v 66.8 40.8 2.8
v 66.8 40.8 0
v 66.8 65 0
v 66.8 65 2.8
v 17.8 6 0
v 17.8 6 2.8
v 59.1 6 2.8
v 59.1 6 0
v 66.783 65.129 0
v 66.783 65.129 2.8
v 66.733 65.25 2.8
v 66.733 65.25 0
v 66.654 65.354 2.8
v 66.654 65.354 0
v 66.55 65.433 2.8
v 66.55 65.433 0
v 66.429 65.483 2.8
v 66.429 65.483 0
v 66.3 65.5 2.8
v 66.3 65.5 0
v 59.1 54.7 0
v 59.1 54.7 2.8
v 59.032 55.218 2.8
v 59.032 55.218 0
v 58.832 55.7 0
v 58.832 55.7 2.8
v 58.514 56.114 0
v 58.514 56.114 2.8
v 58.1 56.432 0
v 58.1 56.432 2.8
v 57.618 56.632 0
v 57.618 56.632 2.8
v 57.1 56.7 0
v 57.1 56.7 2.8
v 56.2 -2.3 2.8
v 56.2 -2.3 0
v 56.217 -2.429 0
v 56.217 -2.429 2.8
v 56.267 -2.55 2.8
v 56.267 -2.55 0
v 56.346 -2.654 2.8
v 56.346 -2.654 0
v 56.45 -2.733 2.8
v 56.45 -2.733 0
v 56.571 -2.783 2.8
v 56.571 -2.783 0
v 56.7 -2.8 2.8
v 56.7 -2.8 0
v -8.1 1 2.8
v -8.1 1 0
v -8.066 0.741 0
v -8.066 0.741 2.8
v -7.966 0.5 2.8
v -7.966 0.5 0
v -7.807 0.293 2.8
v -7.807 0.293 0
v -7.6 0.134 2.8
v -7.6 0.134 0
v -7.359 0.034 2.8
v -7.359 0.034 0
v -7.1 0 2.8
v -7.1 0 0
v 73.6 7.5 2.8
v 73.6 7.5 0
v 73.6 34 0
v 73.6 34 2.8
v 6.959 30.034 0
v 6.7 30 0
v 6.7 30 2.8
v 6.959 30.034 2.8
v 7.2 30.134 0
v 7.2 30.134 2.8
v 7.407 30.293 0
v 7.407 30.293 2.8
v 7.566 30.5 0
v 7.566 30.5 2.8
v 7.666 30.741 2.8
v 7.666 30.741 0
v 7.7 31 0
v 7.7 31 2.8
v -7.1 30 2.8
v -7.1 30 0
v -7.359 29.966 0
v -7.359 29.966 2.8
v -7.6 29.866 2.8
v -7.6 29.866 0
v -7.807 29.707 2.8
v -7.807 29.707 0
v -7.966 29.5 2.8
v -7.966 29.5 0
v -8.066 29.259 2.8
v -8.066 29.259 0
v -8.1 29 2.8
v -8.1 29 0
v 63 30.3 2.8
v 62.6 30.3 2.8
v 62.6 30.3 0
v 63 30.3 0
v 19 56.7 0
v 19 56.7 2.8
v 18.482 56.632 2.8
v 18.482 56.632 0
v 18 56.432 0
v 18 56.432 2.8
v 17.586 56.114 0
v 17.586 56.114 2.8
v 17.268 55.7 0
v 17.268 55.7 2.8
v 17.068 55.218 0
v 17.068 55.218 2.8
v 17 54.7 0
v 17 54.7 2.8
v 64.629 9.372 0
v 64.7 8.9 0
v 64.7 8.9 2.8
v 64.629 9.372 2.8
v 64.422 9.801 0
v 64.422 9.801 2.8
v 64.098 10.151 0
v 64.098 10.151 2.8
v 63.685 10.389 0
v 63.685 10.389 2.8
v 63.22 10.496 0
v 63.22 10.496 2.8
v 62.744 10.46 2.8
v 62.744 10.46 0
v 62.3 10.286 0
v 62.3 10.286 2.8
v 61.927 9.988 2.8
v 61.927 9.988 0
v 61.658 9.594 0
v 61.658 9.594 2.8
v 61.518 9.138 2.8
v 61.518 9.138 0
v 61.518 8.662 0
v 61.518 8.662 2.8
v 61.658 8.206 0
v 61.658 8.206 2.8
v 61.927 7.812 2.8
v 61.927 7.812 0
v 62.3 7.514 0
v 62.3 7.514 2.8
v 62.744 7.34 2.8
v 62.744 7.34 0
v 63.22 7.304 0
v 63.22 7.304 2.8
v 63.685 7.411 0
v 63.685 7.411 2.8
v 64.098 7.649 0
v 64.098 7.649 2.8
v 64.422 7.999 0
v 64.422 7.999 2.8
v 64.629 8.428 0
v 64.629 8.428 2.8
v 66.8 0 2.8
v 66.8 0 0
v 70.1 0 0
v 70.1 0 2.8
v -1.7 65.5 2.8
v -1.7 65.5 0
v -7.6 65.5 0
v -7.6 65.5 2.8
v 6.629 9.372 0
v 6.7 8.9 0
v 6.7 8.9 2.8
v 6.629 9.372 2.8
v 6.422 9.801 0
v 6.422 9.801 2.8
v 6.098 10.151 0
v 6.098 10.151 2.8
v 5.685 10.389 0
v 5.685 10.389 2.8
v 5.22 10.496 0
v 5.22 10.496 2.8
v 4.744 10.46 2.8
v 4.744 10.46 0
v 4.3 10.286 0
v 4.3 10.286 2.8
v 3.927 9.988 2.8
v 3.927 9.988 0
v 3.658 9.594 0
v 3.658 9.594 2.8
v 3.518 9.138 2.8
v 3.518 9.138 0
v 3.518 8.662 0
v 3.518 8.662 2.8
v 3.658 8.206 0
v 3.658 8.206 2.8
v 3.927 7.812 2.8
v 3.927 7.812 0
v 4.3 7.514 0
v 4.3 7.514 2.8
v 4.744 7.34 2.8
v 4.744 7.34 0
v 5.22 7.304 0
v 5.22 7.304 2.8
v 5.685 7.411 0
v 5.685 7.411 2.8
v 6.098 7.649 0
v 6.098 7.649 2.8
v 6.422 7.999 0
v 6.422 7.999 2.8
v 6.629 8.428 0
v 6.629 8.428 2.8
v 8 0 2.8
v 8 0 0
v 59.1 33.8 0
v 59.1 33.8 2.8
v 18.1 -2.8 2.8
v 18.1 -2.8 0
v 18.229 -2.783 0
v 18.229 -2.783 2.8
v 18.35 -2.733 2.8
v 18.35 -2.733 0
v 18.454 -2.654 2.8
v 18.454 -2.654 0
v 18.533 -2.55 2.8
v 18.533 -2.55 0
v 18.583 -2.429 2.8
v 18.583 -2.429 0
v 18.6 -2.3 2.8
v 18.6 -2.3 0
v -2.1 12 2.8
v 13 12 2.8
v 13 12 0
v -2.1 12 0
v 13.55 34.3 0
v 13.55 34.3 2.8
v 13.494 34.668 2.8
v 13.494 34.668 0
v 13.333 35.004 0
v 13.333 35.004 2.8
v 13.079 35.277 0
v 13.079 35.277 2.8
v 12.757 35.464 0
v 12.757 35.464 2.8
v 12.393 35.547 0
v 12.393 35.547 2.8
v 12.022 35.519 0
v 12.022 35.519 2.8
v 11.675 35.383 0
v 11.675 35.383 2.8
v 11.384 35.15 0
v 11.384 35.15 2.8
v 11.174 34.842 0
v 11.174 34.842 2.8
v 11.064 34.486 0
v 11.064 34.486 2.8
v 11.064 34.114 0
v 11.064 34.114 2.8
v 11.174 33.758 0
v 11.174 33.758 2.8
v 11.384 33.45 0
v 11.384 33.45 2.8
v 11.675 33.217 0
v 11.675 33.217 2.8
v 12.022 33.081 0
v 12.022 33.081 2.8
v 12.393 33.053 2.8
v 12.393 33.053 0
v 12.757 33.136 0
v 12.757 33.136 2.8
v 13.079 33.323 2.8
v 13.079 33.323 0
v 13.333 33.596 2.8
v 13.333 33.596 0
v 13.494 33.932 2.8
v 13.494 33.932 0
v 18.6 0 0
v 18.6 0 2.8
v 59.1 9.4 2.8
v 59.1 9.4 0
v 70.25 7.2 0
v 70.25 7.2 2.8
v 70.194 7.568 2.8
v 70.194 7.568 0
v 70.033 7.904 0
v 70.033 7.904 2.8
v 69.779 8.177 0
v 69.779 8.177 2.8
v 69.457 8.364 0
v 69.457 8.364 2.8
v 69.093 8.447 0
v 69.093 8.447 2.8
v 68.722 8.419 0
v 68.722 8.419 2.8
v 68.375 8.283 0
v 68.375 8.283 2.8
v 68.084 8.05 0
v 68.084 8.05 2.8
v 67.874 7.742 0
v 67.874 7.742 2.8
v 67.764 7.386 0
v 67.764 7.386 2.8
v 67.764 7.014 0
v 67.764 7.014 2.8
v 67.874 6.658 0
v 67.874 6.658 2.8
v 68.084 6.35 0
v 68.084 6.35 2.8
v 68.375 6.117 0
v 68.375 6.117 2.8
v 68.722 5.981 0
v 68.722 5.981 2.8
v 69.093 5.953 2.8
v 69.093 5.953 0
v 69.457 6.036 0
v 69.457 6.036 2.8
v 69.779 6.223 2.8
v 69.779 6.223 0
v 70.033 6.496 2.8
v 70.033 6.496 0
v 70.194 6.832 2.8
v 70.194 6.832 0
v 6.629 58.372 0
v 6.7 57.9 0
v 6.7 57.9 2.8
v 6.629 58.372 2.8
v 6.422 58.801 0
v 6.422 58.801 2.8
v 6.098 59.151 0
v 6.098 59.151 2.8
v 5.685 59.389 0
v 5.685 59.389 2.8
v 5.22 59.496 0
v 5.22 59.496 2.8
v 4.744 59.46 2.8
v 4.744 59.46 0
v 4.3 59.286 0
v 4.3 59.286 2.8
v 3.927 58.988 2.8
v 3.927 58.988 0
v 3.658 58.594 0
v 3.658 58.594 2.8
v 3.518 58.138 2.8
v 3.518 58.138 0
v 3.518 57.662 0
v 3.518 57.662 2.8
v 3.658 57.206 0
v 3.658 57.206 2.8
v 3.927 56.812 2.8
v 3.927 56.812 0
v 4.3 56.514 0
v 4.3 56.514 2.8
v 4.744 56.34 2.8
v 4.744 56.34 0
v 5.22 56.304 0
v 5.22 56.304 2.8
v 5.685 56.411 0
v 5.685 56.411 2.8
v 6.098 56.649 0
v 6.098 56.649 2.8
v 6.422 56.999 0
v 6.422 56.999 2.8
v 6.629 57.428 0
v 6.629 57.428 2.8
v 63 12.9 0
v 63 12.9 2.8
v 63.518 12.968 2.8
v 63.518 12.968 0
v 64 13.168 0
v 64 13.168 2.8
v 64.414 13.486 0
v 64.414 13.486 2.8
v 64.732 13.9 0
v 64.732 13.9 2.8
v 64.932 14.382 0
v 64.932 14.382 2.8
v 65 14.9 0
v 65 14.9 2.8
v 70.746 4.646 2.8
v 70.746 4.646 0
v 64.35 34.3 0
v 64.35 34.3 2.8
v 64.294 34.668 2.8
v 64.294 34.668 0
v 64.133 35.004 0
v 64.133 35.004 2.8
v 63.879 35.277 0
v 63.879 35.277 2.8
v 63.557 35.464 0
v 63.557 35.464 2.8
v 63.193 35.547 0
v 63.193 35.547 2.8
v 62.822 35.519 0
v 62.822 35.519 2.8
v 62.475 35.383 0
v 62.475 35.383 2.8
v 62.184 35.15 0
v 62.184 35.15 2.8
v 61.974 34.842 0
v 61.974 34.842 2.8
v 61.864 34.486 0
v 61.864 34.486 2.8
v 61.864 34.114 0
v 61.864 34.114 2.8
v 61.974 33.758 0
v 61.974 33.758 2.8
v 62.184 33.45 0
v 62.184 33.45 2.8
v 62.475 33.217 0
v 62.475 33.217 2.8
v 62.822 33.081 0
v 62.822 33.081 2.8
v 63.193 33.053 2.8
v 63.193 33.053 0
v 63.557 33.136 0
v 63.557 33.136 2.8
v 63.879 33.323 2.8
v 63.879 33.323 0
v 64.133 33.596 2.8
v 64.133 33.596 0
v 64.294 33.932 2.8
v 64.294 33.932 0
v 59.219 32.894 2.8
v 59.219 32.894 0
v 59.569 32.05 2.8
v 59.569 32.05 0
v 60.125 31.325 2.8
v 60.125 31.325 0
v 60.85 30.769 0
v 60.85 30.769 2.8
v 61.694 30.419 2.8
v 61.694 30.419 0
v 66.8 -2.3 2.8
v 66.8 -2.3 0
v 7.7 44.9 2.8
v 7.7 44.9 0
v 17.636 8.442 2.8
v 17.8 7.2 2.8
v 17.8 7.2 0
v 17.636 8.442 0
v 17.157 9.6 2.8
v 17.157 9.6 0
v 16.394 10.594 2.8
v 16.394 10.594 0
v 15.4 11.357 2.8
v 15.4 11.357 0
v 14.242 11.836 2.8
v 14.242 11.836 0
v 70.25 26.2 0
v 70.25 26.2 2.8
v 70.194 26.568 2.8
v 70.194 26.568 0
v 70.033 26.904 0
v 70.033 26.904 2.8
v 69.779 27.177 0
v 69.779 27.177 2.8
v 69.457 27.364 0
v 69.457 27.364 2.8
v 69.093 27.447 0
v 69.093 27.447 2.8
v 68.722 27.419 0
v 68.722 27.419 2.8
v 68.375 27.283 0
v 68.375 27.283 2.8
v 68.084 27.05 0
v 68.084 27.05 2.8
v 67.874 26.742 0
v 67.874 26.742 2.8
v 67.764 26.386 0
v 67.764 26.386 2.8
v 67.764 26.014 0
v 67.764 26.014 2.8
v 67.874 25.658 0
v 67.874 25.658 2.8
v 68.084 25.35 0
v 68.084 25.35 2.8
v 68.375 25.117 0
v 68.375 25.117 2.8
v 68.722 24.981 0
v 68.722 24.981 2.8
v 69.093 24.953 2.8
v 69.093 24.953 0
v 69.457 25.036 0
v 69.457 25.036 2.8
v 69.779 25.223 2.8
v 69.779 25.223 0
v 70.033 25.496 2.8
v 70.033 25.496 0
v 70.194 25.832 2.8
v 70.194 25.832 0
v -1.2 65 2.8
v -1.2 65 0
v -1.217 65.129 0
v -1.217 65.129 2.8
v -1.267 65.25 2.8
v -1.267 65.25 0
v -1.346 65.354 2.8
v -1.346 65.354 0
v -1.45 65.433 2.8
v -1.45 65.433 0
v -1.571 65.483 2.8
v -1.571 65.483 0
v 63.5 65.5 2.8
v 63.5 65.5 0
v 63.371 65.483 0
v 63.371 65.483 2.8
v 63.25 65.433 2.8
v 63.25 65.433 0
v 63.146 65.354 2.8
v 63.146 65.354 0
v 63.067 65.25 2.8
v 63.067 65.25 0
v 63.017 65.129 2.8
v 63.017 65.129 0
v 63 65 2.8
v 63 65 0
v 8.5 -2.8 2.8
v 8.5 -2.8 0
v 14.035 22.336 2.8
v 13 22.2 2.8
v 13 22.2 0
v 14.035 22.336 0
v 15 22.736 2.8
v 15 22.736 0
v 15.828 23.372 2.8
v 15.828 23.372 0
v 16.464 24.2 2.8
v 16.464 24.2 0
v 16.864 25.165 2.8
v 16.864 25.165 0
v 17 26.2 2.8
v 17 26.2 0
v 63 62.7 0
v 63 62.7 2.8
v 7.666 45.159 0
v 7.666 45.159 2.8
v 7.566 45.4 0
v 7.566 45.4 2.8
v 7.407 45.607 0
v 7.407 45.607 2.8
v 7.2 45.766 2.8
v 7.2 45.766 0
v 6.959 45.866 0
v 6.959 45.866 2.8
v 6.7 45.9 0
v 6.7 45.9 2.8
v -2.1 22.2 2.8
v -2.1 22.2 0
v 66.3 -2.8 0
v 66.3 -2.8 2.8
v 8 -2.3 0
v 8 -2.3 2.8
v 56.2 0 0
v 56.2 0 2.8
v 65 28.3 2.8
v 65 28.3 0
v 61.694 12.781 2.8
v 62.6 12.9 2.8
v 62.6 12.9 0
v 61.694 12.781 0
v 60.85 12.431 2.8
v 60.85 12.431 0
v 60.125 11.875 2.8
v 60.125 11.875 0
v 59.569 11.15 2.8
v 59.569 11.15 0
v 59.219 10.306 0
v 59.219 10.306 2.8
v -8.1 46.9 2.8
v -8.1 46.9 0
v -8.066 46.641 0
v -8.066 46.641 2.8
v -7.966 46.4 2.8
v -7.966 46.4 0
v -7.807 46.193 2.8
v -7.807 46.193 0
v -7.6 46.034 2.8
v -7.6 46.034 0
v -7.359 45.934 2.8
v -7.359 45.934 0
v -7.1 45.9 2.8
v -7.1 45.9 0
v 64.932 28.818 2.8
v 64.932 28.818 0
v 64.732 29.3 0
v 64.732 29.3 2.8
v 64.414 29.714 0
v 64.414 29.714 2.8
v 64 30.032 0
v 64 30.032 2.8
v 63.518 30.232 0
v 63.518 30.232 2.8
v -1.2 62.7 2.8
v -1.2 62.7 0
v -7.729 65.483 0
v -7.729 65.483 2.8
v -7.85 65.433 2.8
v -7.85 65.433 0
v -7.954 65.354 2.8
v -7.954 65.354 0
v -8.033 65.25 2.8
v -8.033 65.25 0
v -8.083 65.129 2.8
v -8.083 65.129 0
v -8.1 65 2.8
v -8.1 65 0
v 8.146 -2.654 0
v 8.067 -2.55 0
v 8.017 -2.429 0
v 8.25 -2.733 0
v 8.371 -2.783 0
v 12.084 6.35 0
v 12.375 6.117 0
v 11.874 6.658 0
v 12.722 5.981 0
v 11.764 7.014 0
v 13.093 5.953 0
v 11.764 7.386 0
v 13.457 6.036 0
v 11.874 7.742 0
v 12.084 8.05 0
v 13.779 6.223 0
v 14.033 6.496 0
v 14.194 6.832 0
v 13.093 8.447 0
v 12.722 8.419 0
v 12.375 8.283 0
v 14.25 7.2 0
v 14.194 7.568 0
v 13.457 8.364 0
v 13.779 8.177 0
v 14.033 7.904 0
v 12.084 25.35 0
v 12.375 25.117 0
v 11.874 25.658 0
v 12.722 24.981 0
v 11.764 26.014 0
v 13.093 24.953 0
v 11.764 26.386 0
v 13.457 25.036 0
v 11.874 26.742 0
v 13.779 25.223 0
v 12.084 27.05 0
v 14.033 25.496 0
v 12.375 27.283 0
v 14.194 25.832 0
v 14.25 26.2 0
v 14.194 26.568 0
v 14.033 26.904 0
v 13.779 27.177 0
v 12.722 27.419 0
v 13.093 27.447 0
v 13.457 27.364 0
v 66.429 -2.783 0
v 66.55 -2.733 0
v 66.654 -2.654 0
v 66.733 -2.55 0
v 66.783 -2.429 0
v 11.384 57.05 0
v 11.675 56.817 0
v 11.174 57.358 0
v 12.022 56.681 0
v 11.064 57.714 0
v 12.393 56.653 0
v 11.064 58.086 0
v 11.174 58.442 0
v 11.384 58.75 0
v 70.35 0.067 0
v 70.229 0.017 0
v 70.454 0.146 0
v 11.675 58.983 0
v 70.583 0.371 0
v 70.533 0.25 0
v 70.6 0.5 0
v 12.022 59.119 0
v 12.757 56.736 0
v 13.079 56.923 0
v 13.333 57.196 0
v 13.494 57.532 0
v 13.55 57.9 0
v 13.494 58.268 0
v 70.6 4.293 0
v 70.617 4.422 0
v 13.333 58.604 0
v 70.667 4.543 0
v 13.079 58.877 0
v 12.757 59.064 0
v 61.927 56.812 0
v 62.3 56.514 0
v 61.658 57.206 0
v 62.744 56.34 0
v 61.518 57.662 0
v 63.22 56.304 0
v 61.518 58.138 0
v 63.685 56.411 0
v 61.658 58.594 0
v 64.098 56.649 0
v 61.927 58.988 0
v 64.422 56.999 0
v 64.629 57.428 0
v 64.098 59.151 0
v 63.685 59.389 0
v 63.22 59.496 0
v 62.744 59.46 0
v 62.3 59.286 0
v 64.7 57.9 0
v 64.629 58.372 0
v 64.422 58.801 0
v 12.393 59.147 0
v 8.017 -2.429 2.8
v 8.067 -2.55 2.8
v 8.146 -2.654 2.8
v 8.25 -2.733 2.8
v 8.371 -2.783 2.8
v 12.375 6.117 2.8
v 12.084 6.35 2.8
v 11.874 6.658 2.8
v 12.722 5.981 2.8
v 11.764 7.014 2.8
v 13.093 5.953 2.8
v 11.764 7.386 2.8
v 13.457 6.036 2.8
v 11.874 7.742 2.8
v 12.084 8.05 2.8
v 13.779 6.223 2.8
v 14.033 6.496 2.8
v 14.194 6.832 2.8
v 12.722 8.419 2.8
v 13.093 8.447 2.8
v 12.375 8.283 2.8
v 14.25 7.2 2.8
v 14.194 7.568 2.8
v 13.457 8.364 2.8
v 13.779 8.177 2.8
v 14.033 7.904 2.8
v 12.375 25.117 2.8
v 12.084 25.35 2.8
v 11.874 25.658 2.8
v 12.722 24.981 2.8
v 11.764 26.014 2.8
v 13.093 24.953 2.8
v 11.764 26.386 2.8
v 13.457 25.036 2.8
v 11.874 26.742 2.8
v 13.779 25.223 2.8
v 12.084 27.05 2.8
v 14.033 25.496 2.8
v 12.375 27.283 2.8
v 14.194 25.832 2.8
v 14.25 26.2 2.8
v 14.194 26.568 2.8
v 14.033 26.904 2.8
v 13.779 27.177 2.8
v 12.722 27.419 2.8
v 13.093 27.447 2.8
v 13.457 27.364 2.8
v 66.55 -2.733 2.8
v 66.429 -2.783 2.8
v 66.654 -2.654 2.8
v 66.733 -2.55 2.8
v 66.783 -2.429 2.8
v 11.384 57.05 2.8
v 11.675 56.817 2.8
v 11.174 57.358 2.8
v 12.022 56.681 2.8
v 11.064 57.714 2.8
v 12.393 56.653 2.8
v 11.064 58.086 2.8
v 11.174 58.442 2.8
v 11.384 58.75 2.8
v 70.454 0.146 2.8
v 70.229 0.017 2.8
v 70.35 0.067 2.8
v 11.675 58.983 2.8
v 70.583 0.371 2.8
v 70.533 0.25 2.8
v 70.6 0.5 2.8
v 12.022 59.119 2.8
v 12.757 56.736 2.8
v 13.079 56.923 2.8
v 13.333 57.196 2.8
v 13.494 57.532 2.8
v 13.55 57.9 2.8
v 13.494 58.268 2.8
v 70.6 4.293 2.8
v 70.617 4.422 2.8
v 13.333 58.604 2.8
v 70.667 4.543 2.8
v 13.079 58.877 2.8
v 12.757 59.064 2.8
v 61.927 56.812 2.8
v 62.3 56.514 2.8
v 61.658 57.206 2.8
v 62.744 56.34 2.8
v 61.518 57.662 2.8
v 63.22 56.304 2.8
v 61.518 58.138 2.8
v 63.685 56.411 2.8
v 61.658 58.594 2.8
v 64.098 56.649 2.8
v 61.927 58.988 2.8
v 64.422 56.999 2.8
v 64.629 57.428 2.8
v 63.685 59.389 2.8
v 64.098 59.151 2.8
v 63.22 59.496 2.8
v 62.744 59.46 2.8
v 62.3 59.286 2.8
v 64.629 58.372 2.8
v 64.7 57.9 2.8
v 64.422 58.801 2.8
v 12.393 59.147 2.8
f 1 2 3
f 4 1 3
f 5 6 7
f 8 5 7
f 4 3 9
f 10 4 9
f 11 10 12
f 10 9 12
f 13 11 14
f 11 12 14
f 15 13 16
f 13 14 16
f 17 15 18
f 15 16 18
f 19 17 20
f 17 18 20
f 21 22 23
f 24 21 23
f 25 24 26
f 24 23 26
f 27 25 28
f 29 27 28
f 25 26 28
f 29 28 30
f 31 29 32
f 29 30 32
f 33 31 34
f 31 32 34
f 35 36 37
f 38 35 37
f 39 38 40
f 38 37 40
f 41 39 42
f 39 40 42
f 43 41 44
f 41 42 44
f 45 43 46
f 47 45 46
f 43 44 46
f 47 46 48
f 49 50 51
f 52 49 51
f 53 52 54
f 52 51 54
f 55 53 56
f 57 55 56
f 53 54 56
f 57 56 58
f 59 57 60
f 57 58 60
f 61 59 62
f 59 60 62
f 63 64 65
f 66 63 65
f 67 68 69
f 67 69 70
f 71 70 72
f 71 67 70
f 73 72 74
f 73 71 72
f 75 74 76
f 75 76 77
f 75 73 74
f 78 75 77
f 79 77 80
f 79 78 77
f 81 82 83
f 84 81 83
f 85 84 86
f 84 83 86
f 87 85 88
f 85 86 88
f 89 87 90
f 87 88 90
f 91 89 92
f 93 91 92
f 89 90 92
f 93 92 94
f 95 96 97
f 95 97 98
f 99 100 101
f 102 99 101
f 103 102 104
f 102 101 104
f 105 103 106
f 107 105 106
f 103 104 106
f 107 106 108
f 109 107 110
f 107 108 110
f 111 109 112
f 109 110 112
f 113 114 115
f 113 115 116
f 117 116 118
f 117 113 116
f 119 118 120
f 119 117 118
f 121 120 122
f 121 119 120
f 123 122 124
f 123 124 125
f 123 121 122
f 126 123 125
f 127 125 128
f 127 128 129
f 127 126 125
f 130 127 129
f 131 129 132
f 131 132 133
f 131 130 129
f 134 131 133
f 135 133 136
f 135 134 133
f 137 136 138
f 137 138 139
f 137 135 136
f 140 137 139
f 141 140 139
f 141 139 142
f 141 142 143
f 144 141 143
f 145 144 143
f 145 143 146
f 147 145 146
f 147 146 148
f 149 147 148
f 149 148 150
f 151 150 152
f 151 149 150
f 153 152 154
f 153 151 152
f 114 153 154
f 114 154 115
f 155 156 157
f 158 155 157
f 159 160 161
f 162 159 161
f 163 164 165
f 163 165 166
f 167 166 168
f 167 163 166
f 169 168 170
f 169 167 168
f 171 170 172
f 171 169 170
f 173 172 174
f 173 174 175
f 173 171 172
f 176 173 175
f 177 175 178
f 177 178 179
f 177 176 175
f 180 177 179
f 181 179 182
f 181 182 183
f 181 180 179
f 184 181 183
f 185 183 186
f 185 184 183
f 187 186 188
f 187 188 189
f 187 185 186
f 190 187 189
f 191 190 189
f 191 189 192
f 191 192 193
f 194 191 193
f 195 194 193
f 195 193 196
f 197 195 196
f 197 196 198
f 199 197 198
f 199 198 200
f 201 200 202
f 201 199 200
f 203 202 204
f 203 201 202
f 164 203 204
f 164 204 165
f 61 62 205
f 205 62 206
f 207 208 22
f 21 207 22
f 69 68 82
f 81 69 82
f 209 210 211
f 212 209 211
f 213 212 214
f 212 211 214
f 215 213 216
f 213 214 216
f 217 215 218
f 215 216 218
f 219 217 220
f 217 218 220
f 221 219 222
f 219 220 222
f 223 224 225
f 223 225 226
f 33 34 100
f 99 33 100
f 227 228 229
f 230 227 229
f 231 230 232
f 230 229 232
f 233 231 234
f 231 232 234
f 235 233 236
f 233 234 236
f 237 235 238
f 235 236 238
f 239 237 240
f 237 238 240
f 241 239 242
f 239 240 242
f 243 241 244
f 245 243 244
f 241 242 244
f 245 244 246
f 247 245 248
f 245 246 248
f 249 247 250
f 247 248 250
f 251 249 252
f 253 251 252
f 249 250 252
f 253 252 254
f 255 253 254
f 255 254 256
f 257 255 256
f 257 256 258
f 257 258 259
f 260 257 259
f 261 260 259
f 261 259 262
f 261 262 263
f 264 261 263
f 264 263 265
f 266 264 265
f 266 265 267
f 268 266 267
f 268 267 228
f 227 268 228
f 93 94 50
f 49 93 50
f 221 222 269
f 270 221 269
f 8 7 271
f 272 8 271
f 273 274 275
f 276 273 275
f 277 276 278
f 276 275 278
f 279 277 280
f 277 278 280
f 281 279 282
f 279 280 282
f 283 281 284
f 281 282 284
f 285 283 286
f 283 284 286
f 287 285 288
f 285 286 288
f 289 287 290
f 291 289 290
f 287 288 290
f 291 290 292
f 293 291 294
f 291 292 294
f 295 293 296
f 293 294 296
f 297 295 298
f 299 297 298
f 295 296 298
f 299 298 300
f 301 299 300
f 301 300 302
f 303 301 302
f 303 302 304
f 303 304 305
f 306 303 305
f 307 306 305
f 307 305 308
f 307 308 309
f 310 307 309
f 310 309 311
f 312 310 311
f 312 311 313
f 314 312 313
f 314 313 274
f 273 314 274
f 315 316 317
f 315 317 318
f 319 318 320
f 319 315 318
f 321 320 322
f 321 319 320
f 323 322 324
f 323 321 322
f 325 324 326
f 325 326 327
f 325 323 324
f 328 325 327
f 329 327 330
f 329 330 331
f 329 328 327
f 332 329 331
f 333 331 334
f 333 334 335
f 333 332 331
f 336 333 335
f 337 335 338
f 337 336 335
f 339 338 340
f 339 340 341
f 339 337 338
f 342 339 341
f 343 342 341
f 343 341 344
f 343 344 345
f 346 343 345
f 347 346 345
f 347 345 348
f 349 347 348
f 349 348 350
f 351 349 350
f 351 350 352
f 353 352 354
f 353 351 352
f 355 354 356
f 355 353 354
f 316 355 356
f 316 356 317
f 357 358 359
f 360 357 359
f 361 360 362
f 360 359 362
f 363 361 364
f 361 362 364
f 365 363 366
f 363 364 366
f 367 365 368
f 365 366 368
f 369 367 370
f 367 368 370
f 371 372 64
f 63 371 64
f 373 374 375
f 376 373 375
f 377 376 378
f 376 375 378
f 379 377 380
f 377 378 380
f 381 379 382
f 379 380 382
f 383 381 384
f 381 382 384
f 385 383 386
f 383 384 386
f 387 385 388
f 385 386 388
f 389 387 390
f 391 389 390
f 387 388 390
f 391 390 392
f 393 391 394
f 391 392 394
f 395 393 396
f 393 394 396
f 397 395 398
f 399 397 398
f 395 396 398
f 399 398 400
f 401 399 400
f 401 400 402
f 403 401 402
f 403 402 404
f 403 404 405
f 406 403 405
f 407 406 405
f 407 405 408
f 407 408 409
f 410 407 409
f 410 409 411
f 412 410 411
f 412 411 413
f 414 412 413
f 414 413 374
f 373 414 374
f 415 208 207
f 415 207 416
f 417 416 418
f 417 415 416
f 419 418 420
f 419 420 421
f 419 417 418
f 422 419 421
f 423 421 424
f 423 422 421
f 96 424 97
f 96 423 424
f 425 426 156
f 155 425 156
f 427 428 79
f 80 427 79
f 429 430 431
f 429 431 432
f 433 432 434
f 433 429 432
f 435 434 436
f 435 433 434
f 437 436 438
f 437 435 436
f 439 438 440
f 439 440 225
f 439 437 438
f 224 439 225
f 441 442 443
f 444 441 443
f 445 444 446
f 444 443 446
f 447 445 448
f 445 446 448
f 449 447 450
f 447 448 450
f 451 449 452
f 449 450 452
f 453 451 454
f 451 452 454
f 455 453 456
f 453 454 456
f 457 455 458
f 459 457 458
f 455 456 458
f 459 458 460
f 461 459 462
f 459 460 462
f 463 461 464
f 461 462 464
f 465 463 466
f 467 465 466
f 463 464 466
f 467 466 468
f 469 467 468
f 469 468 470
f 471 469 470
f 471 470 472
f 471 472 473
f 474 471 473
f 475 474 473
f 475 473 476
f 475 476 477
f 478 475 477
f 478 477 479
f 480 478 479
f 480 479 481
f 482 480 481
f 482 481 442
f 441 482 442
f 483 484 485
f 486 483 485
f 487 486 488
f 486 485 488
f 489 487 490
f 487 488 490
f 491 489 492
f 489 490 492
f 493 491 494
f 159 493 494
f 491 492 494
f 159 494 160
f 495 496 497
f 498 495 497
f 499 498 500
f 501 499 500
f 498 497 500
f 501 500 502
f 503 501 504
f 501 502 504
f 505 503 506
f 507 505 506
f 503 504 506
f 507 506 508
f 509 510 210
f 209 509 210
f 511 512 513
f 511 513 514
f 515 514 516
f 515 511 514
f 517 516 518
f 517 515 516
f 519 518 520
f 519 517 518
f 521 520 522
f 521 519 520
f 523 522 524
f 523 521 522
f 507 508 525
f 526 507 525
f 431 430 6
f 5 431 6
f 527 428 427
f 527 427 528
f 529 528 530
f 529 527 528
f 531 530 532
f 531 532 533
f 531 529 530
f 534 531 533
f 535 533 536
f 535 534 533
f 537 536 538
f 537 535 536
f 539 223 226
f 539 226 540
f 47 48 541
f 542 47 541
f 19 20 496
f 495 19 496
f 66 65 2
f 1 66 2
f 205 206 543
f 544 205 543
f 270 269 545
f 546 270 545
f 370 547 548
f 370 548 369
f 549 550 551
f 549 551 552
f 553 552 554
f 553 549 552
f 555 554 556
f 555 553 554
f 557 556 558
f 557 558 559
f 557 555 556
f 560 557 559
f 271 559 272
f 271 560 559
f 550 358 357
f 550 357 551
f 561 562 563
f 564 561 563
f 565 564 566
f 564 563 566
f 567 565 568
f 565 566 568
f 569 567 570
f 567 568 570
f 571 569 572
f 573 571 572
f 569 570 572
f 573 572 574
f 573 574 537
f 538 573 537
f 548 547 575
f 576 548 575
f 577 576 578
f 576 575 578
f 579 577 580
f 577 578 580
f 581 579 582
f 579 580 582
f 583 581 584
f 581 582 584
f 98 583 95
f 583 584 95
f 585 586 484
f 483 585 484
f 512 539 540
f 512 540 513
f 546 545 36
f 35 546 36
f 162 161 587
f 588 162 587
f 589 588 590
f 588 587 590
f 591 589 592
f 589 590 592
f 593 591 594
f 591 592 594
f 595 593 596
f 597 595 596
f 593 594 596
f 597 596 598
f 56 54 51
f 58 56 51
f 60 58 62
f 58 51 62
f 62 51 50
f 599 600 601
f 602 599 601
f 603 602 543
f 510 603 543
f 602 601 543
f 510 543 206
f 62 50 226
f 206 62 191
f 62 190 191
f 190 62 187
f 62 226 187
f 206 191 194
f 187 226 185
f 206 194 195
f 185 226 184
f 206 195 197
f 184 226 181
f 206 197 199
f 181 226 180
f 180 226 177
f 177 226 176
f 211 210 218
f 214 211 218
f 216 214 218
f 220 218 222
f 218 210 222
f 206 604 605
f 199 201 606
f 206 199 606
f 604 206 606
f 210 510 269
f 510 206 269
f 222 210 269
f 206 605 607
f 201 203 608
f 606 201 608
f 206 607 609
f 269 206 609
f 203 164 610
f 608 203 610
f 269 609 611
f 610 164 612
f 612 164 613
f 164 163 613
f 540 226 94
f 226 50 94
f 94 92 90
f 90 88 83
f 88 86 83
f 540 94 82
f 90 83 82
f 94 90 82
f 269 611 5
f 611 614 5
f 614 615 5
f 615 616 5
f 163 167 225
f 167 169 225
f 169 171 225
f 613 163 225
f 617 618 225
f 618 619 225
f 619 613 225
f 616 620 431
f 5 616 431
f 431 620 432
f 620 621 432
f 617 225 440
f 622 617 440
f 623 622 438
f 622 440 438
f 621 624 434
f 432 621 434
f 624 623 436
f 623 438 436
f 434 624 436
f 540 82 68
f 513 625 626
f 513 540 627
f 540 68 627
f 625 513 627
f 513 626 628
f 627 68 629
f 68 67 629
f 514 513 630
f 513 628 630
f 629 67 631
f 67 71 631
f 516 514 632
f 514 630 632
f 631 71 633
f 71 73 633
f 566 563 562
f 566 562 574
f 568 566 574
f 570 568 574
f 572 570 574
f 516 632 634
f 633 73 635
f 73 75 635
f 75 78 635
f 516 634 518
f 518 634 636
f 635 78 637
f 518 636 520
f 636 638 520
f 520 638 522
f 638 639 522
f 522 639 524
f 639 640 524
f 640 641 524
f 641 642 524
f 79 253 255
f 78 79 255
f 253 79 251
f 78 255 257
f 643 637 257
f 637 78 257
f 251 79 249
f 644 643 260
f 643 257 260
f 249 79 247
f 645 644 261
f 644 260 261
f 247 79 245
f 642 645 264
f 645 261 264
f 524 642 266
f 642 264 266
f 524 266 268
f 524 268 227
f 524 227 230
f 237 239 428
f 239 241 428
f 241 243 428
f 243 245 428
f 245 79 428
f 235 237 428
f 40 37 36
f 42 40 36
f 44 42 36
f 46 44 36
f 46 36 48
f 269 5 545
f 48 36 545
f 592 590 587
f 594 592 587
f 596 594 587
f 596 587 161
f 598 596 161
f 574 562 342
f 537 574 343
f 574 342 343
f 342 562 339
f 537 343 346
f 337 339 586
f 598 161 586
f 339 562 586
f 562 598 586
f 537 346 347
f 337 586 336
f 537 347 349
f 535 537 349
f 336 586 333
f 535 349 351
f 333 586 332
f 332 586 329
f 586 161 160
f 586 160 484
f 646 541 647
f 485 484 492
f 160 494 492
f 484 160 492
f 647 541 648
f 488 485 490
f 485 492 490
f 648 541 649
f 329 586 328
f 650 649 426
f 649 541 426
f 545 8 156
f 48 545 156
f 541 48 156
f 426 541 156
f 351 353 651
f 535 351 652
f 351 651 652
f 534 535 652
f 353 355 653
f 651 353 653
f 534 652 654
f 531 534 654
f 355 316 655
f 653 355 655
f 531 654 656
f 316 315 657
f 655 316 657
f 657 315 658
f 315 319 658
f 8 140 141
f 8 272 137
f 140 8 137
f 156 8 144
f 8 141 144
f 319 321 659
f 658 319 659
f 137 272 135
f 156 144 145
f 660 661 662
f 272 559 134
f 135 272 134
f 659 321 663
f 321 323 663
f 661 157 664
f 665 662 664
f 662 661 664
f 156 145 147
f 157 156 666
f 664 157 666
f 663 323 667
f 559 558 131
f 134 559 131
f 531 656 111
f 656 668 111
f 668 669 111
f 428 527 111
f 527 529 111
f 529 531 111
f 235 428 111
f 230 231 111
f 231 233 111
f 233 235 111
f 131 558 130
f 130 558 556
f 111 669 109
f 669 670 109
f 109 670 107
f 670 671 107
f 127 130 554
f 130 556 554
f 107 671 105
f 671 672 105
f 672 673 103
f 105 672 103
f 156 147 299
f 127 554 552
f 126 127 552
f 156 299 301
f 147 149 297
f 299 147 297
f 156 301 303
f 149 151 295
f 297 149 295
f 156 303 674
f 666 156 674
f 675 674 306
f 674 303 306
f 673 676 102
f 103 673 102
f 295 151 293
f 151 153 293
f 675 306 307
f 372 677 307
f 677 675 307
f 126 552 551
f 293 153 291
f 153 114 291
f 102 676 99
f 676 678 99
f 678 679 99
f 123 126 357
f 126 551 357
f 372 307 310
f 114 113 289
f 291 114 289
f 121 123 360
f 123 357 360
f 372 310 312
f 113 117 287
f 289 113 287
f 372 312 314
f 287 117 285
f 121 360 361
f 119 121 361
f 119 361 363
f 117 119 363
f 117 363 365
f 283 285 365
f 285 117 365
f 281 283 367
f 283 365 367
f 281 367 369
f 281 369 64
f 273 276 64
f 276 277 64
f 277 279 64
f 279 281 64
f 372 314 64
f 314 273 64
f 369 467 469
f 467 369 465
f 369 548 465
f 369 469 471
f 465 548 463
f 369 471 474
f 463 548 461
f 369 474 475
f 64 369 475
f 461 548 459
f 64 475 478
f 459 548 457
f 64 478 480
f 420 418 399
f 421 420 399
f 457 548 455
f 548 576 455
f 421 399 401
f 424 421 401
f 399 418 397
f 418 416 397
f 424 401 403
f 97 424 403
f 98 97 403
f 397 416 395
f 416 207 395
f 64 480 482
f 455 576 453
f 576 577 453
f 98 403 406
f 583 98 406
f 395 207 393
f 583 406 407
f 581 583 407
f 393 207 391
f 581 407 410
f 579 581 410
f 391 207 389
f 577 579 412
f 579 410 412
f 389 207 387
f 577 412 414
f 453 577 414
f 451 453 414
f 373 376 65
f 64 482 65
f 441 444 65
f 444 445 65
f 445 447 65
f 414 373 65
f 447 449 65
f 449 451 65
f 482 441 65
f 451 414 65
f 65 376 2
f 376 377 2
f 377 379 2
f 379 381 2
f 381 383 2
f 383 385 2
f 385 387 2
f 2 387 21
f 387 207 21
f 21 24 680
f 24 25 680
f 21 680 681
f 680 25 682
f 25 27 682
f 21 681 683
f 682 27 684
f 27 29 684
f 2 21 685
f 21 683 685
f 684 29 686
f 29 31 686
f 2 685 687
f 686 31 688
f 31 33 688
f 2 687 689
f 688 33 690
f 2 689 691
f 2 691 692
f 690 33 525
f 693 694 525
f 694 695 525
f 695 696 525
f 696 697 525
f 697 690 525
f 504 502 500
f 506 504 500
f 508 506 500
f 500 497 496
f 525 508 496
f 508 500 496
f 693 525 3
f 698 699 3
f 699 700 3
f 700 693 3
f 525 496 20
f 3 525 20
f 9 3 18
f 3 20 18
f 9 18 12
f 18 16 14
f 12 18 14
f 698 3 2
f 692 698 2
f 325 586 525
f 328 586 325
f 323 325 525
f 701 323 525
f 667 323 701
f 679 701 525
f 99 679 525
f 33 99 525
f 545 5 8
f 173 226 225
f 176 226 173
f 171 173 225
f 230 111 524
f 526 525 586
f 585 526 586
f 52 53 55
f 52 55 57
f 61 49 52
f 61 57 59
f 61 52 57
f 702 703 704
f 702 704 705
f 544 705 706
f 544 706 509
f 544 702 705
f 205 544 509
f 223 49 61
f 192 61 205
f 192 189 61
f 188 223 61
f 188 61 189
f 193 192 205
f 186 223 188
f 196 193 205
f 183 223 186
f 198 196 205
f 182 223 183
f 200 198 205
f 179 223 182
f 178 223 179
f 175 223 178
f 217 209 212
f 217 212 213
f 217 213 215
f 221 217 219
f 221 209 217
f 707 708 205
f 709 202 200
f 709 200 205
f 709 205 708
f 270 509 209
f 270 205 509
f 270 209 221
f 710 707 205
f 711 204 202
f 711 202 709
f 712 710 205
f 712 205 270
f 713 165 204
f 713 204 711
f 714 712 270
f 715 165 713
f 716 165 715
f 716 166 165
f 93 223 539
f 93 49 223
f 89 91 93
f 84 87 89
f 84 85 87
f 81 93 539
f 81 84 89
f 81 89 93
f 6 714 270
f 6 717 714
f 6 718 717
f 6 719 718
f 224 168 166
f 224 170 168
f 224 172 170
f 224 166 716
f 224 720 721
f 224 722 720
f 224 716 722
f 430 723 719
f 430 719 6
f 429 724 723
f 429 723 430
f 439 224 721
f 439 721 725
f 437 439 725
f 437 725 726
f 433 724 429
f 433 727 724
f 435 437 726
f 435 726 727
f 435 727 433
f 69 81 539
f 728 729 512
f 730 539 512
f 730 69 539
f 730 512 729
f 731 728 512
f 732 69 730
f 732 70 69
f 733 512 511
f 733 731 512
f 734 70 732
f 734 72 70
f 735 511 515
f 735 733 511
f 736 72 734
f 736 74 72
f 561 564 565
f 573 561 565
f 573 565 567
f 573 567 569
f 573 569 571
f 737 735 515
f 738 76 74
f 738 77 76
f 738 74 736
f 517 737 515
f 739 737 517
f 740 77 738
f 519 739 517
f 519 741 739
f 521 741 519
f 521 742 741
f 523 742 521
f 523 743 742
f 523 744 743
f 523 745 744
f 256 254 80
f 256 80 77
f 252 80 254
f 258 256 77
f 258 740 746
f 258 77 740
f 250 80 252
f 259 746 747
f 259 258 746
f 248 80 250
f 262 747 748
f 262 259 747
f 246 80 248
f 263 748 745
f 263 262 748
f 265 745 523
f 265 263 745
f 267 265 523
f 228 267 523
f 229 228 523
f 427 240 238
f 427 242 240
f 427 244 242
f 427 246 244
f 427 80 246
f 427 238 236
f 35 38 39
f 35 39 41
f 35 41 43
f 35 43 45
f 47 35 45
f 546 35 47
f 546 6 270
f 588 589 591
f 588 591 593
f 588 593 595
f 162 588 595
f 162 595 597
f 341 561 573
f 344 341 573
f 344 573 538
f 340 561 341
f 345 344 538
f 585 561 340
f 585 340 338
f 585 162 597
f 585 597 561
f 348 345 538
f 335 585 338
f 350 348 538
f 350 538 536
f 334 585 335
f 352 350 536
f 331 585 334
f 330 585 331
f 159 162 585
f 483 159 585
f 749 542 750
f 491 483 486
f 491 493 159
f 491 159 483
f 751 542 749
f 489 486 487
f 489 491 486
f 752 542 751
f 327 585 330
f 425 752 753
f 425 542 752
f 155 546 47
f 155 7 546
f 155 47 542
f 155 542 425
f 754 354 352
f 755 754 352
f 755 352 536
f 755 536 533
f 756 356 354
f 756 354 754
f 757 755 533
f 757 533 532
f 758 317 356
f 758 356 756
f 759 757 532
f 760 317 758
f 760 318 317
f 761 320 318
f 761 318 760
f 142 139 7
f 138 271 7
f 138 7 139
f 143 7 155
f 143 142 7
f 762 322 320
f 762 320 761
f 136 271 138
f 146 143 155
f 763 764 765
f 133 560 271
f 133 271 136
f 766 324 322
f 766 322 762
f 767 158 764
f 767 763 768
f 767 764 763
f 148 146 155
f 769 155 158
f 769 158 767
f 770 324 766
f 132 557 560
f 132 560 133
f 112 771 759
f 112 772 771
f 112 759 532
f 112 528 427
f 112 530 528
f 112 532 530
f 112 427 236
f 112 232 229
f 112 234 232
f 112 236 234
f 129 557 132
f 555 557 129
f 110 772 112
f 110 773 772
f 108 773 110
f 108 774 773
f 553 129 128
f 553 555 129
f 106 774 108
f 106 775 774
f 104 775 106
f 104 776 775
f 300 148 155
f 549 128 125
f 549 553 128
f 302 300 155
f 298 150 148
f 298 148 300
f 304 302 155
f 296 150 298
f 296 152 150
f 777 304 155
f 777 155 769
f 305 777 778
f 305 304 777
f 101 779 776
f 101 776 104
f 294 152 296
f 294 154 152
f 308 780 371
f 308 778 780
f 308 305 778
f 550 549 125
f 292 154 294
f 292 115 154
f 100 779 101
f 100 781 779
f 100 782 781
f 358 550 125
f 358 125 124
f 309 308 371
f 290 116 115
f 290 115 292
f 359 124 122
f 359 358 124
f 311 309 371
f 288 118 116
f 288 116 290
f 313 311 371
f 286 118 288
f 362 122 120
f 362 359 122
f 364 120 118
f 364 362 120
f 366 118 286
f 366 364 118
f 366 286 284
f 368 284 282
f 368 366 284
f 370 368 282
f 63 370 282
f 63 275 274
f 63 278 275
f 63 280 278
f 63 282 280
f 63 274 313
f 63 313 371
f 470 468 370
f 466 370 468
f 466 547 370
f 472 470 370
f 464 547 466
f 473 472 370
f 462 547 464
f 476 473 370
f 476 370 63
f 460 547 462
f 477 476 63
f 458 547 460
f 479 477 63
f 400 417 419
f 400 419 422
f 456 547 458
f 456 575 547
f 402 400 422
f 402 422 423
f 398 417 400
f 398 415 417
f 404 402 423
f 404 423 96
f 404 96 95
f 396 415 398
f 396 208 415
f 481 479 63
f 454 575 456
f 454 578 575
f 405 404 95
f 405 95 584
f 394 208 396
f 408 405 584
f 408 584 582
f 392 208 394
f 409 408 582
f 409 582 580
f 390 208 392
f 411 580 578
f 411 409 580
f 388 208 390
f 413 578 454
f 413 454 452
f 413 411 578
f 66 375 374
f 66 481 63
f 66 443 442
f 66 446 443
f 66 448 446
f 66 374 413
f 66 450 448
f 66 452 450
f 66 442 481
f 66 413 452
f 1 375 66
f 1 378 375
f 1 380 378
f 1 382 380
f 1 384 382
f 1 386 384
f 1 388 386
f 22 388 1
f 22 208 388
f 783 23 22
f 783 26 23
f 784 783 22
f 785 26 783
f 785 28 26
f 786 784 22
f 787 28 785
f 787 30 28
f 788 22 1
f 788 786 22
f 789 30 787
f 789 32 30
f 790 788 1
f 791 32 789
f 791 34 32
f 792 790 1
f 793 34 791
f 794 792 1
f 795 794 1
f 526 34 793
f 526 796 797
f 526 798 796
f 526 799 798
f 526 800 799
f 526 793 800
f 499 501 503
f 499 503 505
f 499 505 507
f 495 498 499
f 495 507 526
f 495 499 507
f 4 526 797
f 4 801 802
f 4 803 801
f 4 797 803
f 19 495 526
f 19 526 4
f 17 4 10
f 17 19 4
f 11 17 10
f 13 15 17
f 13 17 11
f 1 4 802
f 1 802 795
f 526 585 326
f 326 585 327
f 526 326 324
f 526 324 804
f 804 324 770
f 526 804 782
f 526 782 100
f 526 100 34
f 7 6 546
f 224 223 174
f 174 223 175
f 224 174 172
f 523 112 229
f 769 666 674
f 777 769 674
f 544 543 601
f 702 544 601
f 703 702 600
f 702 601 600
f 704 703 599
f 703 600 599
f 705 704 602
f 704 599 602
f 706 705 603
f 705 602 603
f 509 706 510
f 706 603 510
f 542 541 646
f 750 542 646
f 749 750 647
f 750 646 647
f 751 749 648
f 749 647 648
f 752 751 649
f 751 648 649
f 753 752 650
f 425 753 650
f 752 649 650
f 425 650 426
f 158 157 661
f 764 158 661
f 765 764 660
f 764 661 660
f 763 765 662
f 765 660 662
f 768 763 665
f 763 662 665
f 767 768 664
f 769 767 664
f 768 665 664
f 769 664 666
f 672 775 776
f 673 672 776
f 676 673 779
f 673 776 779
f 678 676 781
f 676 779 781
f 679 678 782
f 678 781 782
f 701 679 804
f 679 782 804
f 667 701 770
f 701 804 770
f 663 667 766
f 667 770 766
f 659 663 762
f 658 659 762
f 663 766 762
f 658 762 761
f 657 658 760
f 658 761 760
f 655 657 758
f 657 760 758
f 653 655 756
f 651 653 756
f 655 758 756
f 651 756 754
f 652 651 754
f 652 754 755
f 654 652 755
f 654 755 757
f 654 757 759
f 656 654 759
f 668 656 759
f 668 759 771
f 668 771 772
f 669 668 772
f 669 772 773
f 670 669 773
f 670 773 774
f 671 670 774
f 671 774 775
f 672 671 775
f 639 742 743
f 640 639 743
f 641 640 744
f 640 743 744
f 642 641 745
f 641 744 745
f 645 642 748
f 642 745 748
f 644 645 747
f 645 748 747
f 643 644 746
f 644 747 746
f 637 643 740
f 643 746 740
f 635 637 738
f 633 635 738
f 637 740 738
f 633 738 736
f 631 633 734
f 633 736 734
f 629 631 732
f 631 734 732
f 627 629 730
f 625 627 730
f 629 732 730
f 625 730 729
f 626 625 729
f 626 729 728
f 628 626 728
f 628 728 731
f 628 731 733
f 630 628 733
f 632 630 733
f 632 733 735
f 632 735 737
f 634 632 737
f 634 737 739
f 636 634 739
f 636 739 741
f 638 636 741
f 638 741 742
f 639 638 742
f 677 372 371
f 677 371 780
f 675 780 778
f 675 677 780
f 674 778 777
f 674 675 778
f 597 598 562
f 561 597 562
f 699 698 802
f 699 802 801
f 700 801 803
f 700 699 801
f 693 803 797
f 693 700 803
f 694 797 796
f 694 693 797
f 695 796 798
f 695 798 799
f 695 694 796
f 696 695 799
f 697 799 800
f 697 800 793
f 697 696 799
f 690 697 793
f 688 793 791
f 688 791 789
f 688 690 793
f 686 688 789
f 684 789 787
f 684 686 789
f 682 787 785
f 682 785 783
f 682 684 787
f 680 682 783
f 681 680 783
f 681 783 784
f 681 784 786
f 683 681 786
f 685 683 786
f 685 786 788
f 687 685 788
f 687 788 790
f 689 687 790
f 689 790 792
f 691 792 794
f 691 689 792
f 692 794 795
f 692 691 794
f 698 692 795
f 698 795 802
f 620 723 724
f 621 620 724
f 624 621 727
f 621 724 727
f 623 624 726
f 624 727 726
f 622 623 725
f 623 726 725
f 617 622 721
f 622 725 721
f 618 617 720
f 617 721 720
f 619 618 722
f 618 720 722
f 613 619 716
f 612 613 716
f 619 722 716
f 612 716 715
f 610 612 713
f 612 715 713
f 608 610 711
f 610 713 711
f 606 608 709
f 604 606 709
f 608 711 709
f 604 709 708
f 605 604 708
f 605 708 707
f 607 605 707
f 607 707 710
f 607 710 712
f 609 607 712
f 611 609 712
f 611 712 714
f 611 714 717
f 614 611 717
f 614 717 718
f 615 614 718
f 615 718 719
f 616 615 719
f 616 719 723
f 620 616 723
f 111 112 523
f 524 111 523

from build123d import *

# Parameters (mm, degrees)
SKETCH_R     = 1.6
PAD_DEPTH    = 2.8
SKETCH001_R  = 1.25
HOLE_DEPTH   = 2.801
POCKET_DEPTH = 2.801


with BuildPart() as part:
    # Sketch → Pad (new body)
    with BuildSketch(Plane.XY):
        with BuildLine():
            Line((1, 0), (8, 0))
            Line((8, 0), (8, -2.3))
            ThreePointArc((8, -2.3), (8.146447, -2.653553), (8.5, -2.8))
            Line((8.5, -2.8), (18.1, -2.8))
            ThreePointArc((18.1, -2.8), (18.453553, -2.653553), (18.6, -2.3))
            Line((18.6, -2.3), (18.6, 0))
            Line((18.6, 0), (56.2, 0))
            Line((56.2, 0), (56.2, -2.3))
            ThreePointArc((56.2, -2.3), (56.346447, -2.653553), (56.7, -2.8))
            Line((56.7, -2.8), (66.3, -2.8))
            ThreePointArc((66.3, -2.8), (66.653553, -2.653553), (66.8, -2.3))
            Line((66.8, -2.3), (66.8, 0))
            Line((66.8, 0), (70.1, 0))
            ThreePointArc((70.1, 0), (70.453553, 0.146447), (70.6, 0.5))
            Line((70.6, 0.5), (70.6, 4.292893))
            ThreePointArc((70.746447, 4.646447), (70.63806, 4.484235), (70.6, 4.292893))
            Line((70.746447, 4.646447), (73.6, 7.5))
            Line((73.6, 7.5), (73.6, 34))
            Line((73.6, 34), (66.8, 40.8))
            Line((66.8, 40.8), (66.8, 65))
            ThreePointArc((66.8, 65), (66.653553, 65.353553), (66.3, 65.5))
            Line((66.3, 65.5), (63.5, 65.5))
            ThreePointArc((63.5, 65.5), (63.146447, 65.353553), (63, 65))
            Line((63, 65), (63, 62.7))
            Line((63, 62.7), (-1.2, 62.7))
            Line((-1.2, 62.7), (-1.2, 65))
            ThreePointArc((-1.2, 65), (-1.346447, 65.353553), (-1.7, 65.5))
            Line((-1.7, 65.5), (-7.6, 65.5))
            ThreePointArc((-7.6, 65.5), (-7.953553, 65.353553), (-8.1, 65))
            Line((-8.1, 65), (-8.1, 46.9))
            ThreePointArc((-8.1, 46.9), (-7.807107, 46.192893), (-7.1, 45.9))
            Line((-7.1, 45.9), (6.7, 45.9))
            ThreePointArc((7.7, 44.9), (7.407107, 45.607107), (6.7, 45.9))
            Line((7.7, 44.9), (7.7, 31))
            ThreePointArc((6.7, 30), (7.407107, 30.292893), (7.7, 31))
            Line((6.7, 30), (-7.1, 30))
            ThreePointArc((-7.1, 30), (-7.807107, 29.707107), (-8.1, 29))
            Line((-8.1, 29), (-8.1, 1))
            ThreePointArc((-8.1, 1), (-7.807107, 0.292893), (-7.1, 0))
            Line((-7.1, 0), (1, 0))
        make_face()
        with Locations((5.1, 57.9)):
            Circle(SKETCH_R, mode=Mode.SUBTRACT)
        with Locations((63.1, 57.9)):
            Circle(SKETCH_R, mode=Mode.SUBTRACT)
        with Locations((5.1, 8.9)):
            Circle(SKETCH_R, mode=Mode.SUBTRACT)
        with Locations((63.1, 8.9)):
            Circle(SKETCH_R, mode=Mode.SUBTRACT)
    extrude(amount=PAD_DEPTH)

    # Sketch001 (on Face46 of Pad) → Hole (cut, through all)
    with BuildSketch(Plane.XY.offset(2.8)):
        with Locations((12.3, 57.9)):
            Circle(SKETCH001_R)
        with Locations((12.3, 34.3)):
            Circle(SKETCH001_R)
        with Locations((63.1, 34.3)):
            Circle(SKETCH001_R)
        with Locations((63.1, 57.9)):
            Circle(SKETCH001_R)
        with Locations((13, 26.2)):
            Circle(SKETCH001_R)
        with Locations((13, 7.2)):
            Circle(SKETCH001_R)
        with Locations((69, 7.2)):
            Circle(SKETCH001_R)
        with Locations((69, 26.2)):
            Circle(SKETCH001_R)
    extrude(amount=-HOLE_DEPTH, mode=Mode.SUBTRACT)

    # Sketch002 (on Face5 of Hole) → Pocket (cut, through all)
    with BuildSketch(Plane.XY.offset(2.8)):
        with BuildLine():
            Line((57.1, 56.7), (19, 56.7))
            ThreePointArc((19, 56.7), (17.585786, 56.114214), (17, 54.7))
            Line((17, 54.7), (17, 26.2))
            ThreePointArc((13, 22.2), (15.828427, 23.371573), (17, 26.2))
            Line((-2.1, 22.2), (13, 22.2))
            Line((-2.1, 12), (-2.1, 22.2))
            Line((13, 12), (-2.1, 12))
            ThreePointArc((17.8, 7.2), (16.394113, 10.594113), (13, 12))
            Line((17.8, 7.2), (17.8, 6))
            Line((17.8, 6), (59.1, 6))
            Line((59.1, 6), (59.1, 9.4))
            ThreePointArc((62.6, 12.9), (60.125126, 11.874874), (59.1, 9.4))
            Line((63, 12.9), (62.6, 12.9))
            ThreePointArc((63, 12.9), (64.414214, 13.485786), (65, 14.9))
            Line((65, 28.3), (65, 14.9))
            ThreePointArc((65, 28.3), (64.414214, 29.714214), (63, 30.3))
            Line((62.6, 30.3), (63, 30.3))
            ThreePointArc((59.1, 33.8), (60.125126, 31.325126), (62.6, 30.3))
            Line((59.1, 33.8), (59.1, 54.7))
            ThreePointArc((59.1, 54.7), (58.514214, 56.114214), (57.1, 56.7))
        make_face()
    extrude(amount=-POCKET_DEPTH, mode=Mode.SUBTRACT)


solid = part.part
